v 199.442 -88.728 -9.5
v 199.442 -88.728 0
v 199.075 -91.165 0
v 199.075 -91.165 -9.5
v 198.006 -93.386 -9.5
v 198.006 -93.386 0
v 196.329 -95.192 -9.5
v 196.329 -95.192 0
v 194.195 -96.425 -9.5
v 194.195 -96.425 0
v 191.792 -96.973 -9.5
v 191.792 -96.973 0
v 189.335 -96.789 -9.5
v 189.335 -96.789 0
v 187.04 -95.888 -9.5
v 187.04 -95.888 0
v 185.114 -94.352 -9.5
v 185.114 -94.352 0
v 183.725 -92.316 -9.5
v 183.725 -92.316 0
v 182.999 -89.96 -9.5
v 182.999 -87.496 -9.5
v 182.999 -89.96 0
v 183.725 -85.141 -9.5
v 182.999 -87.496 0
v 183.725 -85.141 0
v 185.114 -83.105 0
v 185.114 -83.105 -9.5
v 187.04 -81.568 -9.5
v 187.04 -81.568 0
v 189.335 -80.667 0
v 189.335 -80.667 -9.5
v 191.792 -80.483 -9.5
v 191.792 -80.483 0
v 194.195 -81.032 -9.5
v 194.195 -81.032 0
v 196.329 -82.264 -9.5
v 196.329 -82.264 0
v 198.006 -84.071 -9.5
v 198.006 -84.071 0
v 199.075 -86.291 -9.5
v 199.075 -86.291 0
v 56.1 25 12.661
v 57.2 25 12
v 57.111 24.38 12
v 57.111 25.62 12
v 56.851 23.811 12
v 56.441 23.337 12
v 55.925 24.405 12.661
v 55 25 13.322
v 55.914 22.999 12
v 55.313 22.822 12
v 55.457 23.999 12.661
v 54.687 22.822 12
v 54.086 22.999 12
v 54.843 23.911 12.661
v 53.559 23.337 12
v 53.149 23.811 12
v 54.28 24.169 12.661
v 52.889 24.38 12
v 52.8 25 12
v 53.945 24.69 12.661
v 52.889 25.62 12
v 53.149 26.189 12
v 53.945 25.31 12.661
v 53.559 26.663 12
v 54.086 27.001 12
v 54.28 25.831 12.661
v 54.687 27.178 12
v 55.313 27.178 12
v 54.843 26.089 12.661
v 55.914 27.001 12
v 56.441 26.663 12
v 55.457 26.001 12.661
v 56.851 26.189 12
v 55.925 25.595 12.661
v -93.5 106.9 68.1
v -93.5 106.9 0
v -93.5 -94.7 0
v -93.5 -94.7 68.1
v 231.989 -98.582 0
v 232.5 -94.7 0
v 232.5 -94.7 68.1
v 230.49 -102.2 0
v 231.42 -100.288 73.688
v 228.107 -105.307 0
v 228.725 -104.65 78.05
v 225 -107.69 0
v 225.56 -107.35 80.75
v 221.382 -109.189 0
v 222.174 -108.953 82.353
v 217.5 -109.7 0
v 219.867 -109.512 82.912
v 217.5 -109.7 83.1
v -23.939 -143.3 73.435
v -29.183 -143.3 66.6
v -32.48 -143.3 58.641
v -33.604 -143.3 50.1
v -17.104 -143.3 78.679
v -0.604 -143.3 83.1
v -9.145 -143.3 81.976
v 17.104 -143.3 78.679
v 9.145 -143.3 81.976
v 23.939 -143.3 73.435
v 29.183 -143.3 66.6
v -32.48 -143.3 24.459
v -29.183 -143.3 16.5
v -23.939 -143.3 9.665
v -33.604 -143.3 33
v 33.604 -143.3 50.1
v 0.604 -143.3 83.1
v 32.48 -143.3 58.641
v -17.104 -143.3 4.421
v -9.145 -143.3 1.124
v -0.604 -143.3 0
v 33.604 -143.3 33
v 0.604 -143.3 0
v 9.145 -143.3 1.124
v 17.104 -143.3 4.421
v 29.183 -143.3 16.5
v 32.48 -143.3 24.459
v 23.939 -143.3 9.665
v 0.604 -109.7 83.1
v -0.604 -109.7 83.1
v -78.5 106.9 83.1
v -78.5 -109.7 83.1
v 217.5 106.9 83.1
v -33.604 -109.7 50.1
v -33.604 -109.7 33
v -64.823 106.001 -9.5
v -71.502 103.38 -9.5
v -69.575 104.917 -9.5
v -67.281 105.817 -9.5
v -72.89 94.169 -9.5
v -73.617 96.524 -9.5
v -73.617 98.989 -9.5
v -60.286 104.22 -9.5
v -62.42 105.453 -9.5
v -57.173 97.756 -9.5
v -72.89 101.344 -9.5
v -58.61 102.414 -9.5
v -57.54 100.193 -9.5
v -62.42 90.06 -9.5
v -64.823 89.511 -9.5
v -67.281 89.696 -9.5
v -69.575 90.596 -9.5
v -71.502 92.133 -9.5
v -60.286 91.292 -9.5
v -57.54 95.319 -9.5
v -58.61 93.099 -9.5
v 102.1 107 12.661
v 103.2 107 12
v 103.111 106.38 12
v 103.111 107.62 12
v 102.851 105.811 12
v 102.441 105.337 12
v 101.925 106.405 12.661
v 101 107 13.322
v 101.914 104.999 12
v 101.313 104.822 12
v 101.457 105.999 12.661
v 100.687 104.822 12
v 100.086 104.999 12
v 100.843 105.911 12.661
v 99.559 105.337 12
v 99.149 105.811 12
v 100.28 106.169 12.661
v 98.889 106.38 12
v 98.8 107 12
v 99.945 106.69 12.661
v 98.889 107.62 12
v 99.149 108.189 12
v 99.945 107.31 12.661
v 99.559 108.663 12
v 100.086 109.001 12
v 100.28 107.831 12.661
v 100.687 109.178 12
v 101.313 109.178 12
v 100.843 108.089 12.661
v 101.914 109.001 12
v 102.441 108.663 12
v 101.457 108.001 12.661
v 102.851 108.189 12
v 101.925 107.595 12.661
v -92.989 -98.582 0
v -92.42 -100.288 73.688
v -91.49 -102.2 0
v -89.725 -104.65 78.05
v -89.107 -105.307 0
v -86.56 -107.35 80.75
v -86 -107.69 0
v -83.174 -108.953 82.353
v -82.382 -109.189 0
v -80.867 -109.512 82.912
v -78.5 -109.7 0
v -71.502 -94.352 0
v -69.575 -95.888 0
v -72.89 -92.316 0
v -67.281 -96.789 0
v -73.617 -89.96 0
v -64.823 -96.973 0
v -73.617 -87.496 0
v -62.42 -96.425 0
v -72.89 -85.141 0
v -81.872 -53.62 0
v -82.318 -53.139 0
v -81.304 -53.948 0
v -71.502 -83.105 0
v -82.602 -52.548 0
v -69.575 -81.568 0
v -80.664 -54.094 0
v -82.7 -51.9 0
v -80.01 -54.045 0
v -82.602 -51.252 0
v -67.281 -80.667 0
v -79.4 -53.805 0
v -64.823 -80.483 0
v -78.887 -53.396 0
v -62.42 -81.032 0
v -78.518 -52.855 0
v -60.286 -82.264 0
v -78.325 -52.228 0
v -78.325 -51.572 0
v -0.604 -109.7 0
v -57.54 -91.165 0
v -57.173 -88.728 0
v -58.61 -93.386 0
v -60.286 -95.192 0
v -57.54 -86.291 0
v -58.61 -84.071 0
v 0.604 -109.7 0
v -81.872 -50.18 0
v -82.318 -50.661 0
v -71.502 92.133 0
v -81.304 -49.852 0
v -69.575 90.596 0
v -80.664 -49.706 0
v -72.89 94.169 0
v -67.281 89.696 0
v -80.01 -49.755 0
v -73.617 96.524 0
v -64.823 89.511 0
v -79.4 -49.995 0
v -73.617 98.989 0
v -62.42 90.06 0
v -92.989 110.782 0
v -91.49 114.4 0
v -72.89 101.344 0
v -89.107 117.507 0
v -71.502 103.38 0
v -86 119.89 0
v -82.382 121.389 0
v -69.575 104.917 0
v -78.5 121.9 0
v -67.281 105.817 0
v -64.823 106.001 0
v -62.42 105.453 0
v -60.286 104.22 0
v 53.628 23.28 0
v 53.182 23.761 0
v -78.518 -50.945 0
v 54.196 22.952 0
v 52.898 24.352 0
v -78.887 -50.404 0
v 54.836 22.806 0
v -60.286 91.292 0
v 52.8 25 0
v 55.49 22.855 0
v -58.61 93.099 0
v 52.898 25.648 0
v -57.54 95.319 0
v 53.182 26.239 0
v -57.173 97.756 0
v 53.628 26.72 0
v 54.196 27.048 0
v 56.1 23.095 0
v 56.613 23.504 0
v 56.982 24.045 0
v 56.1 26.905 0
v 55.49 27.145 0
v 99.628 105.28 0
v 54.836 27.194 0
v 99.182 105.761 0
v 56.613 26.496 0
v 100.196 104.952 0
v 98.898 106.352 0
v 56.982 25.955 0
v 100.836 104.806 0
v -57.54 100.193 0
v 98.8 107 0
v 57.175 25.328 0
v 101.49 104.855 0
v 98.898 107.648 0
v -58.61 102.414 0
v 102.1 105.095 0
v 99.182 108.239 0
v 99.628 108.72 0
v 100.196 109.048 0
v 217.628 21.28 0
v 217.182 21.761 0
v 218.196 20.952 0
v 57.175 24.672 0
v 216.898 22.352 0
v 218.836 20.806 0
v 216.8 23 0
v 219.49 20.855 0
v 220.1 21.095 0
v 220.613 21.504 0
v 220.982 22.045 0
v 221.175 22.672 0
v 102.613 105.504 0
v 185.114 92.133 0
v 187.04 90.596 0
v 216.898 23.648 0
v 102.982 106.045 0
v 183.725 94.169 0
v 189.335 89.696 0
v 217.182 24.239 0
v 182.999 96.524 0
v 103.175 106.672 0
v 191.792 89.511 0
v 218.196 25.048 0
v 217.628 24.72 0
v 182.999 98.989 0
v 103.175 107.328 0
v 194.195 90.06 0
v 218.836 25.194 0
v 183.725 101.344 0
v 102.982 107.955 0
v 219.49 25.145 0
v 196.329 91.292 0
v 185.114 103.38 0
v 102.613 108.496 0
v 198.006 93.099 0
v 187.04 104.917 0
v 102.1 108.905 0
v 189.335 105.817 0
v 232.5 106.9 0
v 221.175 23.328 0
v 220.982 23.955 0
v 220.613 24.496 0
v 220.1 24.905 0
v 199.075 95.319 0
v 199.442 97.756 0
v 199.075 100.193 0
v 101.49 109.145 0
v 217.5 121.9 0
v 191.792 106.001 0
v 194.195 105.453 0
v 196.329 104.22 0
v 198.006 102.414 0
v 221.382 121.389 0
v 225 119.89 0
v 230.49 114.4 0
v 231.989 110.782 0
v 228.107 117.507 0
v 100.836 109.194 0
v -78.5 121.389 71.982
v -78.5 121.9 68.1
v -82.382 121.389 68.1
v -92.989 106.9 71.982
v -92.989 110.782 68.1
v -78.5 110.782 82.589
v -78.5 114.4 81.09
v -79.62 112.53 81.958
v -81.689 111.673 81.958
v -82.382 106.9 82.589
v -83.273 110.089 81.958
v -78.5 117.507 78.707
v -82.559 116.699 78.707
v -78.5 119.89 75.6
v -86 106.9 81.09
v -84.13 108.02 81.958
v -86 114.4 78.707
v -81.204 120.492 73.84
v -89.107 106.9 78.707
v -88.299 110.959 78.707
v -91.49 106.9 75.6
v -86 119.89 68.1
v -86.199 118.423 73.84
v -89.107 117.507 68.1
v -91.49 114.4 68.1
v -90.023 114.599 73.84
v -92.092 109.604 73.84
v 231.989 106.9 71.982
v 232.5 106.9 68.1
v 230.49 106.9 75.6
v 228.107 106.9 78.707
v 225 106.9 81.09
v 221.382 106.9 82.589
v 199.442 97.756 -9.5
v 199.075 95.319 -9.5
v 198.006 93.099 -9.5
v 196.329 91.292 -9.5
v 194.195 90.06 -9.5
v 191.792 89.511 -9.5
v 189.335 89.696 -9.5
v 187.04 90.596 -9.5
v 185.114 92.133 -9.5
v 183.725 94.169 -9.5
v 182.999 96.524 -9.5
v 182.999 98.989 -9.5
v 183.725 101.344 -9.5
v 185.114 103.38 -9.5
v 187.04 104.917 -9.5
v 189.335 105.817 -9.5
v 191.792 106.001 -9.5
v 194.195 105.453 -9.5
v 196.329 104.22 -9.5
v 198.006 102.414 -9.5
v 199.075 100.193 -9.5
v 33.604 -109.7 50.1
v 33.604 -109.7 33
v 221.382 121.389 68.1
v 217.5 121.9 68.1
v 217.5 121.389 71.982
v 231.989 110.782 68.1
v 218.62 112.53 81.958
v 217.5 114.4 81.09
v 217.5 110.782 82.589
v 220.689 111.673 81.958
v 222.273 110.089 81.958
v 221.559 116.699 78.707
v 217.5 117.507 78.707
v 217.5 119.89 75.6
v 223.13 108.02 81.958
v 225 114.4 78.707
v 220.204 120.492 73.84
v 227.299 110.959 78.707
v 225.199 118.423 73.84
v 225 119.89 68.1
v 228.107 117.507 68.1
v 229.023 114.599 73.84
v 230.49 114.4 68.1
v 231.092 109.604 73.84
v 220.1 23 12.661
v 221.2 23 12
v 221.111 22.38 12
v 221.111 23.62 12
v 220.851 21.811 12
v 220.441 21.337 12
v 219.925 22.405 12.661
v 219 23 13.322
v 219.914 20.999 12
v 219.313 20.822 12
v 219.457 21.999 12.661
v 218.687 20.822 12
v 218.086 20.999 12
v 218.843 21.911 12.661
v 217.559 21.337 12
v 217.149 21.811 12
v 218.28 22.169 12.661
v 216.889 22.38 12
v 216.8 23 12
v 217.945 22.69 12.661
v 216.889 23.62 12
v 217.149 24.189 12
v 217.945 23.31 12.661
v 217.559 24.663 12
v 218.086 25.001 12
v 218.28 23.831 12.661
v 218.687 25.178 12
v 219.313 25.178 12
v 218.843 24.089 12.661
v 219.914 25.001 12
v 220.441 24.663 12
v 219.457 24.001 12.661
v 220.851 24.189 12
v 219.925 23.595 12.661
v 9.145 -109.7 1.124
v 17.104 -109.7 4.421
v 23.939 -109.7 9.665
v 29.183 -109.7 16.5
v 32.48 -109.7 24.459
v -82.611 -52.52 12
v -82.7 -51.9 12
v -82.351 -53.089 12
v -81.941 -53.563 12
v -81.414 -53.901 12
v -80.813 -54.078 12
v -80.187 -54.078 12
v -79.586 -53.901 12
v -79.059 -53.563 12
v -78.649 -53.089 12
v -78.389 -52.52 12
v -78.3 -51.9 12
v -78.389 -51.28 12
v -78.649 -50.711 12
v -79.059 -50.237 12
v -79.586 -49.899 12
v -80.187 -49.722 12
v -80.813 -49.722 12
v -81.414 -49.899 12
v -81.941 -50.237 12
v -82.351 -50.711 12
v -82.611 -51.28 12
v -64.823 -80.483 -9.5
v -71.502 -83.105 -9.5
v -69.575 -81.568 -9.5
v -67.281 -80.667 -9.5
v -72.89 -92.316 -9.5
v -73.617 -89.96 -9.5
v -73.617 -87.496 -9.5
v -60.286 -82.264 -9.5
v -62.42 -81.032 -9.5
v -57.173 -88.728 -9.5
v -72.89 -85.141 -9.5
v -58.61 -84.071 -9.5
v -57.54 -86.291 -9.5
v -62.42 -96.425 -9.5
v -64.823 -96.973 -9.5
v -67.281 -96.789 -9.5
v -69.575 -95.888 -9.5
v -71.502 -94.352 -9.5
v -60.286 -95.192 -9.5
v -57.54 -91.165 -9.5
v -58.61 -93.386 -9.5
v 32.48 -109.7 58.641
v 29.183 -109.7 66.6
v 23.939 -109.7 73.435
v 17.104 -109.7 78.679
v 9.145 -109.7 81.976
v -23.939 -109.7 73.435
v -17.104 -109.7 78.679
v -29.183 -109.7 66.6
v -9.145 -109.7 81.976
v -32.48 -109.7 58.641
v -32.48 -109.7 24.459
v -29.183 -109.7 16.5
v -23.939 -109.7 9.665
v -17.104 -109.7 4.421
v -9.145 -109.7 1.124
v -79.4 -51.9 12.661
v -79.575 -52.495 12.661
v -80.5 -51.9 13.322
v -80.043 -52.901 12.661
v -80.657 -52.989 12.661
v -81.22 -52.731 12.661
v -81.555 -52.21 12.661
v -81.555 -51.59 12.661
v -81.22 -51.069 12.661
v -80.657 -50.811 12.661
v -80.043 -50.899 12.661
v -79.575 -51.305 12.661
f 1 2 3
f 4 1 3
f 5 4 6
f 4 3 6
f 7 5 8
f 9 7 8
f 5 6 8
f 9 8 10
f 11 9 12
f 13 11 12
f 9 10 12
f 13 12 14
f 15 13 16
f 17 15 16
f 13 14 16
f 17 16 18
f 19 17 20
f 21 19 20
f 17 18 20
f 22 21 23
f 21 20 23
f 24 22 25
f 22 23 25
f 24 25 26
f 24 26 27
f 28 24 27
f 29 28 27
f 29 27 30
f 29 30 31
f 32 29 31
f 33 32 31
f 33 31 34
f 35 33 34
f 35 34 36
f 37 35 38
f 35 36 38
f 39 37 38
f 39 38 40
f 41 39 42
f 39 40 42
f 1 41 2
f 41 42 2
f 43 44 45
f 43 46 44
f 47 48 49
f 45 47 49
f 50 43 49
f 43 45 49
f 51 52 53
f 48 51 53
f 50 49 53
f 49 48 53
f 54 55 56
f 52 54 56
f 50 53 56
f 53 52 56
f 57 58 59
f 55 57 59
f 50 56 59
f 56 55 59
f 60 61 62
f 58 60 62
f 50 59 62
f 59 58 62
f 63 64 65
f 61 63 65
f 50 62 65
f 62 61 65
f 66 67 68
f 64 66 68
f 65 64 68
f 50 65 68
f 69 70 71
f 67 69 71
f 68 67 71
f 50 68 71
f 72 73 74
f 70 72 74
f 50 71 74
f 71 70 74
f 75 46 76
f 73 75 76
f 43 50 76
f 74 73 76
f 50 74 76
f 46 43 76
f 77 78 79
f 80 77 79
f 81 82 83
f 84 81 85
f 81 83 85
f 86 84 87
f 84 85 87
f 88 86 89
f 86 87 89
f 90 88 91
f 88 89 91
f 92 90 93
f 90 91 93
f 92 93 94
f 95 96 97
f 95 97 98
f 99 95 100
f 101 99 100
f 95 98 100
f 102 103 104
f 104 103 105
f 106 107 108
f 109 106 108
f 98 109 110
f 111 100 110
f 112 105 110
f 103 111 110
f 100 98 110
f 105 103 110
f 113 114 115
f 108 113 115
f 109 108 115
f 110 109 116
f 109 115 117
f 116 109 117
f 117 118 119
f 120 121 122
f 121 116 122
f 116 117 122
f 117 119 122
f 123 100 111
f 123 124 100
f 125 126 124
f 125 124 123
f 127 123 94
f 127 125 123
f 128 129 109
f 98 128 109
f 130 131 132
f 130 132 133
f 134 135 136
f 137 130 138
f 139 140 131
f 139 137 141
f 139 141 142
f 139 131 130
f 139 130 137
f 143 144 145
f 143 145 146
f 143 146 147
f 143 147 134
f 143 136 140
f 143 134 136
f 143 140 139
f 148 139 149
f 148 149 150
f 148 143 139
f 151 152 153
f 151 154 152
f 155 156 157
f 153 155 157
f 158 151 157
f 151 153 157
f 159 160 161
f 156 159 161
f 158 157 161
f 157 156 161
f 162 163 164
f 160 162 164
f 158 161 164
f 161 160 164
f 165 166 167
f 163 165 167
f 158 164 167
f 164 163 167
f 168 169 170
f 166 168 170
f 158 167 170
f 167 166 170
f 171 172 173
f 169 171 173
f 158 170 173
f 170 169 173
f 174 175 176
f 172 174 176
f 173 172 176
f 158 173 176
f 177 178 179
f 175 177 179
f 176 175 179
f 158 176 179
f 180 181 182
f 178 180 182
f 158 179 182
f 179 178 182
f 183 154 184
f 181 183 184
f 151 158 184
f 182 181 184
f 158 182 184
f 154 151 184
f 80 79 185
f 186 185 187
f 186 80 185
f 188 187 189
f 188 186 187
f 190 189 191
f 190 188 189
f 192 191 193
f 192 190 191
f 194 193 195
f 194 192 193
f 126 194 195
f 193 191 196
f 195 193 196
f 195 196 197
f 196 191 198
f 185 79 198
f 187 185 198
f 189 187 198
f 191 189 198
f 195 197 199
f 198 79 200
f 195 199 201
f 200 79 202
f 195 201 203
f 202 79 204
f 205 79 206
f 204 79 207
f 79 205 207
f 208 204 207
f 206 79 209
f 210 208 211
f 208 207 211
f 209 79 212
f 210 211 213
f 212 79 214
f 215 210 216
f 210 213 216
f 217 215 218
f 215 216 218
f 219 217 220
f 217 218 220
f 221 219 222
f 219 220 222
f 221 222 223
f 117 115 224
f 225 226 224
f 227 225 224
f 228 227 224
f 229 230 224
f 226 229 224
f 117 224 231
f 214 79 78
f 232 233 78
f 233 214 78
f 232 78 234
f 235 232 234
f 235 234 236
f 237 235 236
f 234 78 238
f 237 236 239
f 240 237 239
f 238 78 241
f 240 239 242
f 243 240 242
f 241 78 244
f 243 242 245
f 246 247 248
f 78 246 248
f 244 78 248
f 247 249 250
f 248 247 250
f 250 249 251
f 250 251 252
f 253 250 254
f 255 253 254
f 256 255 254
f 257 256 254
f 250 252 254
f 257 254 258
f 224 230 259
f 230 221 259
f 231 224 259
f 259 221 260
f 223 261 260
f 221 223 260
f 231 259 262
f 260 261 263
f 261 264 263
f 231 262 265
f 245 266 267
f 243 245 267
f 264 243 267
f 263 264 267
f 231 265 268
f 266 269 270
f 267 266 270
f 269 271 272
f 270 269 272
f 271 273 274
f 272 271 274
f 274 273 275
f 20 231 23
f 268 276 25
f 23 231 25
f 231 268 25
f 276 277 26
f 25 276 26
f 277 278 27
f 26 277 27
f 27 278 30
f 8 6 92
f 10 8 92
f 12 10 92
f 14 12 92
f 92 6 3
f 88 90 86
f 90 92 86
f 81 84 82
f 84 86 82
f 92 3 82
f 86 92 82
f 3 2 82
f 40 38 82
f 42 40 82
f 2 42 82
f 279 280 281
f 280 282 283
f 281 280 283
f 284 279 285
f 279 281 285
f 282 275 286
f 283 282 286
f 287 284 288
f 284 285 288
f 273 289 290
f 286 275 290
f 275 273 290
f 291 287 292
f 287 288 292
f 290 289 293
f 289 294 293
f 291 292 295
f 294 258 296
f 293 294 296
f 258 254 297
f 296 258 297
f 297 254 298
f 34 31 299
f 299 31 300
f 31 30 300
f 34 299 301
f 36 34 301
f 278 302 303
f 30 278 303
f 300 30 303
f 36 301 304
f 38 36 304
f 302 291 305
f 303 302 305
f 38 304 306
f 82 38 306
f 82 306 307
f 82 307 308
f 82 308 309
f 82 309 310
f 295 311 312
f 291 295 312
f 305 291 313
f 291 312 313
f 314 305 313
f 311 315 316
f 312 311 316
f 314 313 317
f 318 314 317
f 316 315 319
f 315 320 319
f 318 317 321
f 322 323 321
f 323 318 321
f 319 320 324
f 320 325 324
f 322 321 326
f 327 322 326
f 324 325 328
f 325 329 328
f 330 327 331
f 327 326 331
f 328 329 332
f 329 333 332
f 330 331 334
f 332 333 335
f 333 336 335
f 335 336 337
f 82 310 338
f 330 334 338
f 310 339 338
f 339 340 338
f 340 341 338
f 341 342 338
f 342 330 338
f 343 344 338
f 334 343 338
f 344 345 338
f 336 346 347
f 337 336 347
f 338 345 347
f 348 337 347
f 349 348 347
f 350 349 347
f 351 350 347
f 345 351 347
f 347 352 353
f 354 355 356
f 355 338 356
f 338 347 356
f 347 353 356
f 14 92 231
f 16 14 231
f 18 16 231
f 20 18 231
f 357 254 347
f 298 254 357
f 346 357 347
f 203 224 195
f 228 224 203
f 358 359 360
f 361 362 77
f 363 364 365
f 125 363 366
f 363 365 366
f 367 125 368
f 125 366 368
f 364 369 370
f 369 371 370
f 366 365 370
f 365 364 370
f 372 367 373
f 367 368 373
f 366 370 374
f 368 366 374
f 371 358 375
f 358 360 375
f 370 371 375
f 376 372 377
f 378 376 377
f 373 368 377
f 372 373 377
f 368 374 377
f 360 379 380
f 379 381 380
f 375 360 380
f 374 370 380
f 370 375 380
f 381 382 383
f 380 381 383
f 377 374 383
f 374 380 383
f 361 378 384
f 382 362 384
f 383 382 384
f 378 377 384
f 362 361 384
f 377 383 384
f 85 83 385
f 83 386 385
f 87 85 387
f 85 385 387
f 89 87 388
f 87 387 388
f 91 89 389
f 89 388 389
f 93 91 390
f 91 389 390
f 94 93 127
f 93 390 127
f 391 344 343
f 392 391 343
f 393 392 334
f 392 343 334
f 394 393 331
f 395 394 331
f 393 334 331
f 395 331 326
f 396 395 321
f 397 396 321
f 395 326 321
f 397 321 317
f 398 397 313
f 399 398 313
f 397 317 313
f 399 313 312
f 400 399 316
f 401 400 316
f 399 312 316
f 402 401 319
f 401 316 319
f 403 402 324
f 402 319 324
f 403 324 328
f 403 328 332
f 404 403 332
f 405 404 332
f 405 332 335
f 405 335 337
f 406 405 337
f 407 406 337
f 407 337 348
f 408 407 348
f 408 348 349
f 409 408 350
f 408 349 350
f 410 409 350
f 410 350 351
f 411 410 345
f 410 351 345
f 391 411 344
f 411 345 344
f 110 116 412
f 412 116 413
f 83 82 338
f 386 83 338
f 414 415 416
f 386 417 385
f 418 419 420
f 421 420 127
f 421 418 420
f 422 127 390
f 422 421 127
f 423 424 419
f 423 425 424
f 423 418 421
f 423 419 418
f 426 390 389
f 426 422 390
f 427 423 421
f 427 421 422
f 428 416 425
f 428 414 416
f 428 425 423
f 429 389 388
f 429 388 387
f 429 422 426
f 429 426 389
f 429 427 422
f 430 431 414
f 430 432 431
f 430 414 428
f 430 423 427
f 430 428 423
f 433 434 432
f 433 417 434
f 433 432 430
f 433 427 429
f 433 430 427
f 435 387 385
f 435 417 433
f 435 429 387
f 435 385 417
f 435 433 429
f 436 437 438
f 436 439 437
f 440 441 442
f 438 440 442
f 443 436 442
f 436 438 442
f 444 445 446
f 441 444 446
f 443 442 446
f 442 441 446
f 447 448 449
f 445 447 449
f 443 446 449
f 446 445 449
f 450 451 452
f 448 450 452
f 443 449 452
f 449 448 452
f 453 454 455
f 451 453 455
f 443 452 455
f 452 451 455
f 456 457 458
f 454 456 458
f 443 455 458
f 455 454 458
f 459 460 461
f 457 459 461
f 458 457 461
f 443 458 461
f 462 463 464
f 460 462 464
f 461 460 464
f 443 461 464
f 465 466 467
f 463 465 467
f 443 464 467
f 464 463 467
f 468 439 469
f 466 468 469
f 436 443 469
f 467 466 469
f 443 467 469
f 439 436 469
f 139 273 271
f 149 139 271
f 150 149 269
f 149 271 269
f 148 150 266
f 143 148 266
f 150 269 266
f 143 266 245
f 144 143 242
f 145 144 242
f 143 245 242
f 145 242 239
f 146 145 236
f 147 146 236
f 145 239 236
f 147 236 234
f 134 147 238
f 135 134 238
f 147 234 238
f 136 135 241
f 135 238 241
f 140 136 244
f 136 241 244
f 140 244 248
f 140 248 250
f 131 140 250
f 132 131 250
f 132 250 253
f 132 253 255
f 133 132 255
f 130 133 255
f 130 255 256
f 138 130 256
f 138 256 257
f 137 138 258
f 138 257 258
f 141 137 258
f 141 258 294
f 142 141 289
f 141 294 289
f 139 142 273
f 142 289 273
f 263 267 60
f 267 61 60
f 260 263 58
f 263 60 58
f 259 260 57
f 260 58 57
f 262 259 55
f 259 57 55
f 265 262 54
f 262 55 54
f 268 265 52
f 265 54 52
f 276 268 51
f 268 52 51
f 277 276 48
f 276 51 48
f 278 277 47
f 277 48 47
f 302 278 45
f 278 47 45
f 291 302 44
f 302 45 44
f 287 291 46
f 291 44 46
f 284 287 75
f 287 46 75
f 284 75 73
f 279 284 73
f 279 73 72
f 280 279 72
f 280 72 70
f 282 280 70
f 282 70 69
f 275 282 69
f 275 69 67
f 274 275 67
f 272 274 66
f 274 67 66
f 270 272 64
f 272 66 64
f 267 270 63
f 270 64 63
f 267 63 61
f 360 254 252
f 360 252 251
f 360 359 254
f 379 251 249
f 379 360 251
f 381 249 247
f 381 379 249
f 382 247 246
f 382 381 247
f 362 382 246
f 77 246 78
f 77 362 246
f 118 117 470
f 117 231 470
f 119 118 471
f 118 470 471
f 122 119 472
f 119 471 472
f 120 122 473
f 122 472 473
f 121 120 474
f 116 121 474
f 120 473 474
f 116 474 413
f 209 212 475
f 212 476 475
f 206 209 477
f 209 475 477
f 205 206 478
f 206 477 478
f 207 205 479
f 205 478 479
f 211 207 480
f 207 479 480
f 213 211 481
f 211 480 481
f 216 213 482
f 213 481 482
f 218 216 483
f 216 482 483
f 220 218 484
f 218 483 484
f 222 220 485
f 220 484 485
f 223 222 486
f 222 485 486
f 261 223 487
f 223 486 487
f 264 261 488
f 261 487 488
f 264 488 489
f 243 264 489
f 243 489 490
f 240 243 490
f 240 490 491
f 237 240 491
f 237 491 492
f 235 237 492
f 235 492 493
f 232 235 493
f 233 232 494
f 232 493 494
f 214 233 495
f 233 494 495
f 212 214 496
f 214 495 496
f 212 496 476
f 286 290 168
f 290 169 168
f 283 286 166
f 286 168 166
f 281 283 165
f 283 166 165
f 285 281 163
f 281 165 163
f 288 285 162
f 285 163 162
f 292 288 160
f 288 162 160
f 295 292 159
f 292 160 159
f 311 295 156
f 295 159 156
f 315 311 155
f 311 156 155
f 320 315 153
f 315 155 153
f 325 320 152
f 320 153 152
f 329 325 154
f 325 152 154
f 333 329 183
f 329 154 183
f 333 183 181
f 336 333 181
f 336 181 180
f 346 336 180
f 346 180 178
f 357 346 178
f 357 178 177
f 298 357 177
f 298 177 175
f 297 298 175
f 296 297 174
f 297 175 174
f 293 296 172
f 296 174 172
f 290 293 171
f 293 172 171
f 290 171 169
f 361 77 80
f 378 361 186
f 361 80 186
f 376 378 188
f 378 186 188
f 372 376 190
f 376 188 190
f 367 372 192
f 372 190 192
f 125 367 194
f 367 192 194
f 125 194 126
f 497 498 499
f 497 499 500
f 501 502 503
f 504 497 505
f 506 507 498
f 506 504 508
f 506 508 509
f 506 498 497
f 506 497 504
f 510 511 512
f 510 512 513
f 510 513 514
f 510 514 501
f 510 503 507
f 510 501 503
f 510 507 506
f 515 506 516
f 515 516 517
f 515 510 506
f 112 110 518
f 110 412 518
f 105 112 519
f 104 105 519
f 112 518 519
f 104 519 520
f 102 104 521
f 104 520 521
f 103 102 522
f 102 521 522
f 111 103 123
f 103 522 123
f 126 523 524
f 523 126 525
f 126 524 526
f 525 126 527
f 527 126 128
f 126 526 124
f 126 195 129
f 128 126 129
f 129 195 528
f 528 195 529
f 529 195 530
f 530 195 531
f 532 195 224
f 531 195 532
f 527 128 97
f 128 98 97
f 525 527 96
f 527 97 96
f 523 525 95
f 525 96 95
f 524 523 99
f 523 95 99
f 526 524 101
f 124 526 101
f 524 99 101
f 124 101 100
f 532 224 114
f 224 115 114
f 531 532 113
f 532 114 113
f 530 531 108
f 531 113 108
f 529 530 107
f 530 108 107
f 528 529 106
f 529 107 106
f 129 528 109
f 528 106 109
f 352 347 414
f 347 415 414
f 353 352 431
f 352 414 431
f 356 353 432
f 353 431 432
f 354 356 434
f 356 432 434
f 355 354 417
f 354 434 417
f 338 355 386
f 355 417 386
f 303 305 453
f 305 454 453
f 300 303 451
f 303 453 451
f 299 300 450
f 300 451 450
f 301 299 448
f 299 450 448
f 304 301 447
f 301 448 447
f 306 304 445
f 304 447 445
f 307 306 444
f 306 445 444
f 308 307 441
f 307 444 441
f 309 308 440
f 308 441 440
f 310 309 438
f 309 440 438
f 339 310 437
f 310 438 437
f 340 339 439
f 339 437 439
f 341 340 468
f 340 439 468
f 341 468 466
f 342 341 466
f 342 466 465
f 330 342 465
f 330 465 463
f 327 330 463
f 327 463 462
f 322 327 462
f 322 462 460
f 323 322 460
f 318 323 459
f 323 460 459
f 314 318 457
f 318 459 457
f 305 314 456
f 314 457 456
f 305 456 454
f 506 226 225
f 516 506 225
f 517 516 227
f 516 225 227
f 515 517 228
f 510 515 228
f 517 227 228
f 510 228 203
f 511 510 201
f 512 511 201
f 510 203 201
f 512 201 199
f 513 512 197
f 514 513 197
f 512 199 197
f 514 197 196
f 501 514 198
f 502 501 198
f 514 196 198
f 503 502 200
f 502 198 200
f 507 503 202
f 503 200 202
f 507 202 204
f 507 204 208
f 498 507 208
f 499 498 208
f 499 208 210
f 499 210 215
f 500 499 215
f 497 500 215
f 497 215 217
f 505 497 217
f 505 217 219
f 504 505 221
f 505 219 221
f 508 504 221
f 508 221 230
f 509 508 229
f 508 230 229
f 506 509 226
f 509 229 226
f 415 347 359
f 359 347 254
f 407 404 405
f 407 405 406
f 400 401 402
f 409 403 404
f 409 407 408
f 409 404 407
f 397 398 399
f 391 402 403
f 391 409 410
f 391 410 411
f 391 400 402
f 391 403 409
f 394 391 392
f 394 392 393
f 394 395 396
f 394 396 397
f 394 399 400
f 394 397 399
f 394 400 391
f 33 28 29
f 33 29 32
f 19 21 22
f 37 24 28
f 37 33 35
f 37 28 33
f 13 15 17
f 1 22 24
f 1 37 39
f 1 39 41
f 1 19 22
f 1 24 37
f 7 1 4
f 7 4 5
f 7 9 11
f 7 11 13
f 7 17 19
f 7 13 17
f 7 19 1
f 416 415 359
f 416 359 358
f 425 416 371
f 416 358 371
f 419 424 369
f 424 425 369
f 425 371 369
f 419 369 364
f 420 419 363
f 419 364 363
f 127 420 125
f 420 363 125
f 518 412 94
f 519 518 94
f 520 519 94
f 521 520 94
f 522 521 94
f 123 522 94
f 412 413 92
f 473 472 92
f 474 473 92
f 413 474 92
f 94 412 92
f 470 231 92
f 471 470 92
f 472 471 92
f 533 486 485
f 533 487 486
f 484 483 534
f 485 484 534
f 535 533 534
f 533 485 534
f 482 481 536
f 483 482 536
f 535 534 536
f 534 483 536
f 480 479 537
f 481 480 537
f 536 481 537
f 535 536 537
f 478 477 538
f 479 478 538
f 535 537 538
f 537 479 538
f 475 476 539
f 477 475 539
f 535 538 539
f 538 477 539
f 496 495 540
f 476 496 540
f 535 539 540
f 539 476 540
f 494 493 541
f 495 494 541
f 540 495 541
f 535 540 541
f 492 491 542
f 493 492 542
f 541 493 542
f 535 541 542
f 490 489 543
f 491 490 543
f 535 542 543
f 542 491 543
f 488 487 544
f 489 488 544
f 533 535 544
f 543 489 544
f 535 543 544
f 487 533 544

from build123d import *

# Parameters (mm, degrees)
F1_DEPTH = 83.1
F2_R     = 8.2679972053
F3_DEPTH = 9.5
F4_R     = 15
F5_R     = 33
F7_D     = 4.4
F7_DEPTH = 12
F7_TIP   = 1.3218933619


with BuildPart() as f1:
    # F0 (on Top) → F1 (new body)
    with BuildSketch(Plane.XY):
        Polygon((232.5, 121.9), (-93.5, 121.9), (-93.5, -109.7), (-33.6043722928, -109.7), (-33.6043722928, -143.3), (33.6043722928, -143.3), (33.6043722928, -109.7), (232.5, -109.7), align=None)
    extrude(amount=F1_DEPTH)

    # F2 (on face) → F3 (join)
    with BuildSketch(Plane(origin=(0, 0, 0), x_dir=(1, 0, 0), z_dir=(0, 0, -1))):
        with Locations((-65.4409214878, 88.7281829967)):
            Circle(F2_R)
        with Locations((-65.4409214878, -97.7562729967)):
            Circle(F2_R)
        with Locations((191.1744738977, 88.7281829967)):
            Circle(F2_R)
        with Locations((191.1744738977, -97.7562729967)):
            Circle(F2_R)
    extrude(amount=F3_DEPTH)

    # F4
    f4_edges = [f1.edges().sort_by_distance(p)[0] for p in [
        (-93.5, -109.7, 41.55),
        (232.5, -109.7, 41.55),
        (-93.5, 121.9, 41.55),
        (232.5, 121.9, 41.55),
        (69.5, 121.9, 83.1),
        (-93.5, 6.1, 83.1),
        (232.5, 6.1, 83.1),
    ]]
    fillet(f4_edges, radius=F4_R)

    # F5
    f5_edges = [f1.edges().sort_by_distance(p)[0] for p in [
        (-33.604372, -126.5, 83.1),
        (33.604372, -126.5, 83.1),
        (-33.604372, -126.5, 0),
        (33.604372, -126.5, 0),
    ]]
    fillet(f5_edges, radius=F5_R)

    # F7
    with Locations(Plane(origin=(0, 0, 0), x_dir=(1, 0, 0), z_dir=(0, 0, -1))):
        with Locations((-80.5, 51.9), (55, -25), (101, -107), (219, -23)):
            Hole(F7_D / 2, depth=F7_DEPTH)
            with Locations((0, 0, -(F7_DEPTH + F7_TIP / 2))):  # 118° drill point
                Cone(0, F7_D / 2, F7_TIP, mode=Mode.SUBTRACT)


solid = f1.part
